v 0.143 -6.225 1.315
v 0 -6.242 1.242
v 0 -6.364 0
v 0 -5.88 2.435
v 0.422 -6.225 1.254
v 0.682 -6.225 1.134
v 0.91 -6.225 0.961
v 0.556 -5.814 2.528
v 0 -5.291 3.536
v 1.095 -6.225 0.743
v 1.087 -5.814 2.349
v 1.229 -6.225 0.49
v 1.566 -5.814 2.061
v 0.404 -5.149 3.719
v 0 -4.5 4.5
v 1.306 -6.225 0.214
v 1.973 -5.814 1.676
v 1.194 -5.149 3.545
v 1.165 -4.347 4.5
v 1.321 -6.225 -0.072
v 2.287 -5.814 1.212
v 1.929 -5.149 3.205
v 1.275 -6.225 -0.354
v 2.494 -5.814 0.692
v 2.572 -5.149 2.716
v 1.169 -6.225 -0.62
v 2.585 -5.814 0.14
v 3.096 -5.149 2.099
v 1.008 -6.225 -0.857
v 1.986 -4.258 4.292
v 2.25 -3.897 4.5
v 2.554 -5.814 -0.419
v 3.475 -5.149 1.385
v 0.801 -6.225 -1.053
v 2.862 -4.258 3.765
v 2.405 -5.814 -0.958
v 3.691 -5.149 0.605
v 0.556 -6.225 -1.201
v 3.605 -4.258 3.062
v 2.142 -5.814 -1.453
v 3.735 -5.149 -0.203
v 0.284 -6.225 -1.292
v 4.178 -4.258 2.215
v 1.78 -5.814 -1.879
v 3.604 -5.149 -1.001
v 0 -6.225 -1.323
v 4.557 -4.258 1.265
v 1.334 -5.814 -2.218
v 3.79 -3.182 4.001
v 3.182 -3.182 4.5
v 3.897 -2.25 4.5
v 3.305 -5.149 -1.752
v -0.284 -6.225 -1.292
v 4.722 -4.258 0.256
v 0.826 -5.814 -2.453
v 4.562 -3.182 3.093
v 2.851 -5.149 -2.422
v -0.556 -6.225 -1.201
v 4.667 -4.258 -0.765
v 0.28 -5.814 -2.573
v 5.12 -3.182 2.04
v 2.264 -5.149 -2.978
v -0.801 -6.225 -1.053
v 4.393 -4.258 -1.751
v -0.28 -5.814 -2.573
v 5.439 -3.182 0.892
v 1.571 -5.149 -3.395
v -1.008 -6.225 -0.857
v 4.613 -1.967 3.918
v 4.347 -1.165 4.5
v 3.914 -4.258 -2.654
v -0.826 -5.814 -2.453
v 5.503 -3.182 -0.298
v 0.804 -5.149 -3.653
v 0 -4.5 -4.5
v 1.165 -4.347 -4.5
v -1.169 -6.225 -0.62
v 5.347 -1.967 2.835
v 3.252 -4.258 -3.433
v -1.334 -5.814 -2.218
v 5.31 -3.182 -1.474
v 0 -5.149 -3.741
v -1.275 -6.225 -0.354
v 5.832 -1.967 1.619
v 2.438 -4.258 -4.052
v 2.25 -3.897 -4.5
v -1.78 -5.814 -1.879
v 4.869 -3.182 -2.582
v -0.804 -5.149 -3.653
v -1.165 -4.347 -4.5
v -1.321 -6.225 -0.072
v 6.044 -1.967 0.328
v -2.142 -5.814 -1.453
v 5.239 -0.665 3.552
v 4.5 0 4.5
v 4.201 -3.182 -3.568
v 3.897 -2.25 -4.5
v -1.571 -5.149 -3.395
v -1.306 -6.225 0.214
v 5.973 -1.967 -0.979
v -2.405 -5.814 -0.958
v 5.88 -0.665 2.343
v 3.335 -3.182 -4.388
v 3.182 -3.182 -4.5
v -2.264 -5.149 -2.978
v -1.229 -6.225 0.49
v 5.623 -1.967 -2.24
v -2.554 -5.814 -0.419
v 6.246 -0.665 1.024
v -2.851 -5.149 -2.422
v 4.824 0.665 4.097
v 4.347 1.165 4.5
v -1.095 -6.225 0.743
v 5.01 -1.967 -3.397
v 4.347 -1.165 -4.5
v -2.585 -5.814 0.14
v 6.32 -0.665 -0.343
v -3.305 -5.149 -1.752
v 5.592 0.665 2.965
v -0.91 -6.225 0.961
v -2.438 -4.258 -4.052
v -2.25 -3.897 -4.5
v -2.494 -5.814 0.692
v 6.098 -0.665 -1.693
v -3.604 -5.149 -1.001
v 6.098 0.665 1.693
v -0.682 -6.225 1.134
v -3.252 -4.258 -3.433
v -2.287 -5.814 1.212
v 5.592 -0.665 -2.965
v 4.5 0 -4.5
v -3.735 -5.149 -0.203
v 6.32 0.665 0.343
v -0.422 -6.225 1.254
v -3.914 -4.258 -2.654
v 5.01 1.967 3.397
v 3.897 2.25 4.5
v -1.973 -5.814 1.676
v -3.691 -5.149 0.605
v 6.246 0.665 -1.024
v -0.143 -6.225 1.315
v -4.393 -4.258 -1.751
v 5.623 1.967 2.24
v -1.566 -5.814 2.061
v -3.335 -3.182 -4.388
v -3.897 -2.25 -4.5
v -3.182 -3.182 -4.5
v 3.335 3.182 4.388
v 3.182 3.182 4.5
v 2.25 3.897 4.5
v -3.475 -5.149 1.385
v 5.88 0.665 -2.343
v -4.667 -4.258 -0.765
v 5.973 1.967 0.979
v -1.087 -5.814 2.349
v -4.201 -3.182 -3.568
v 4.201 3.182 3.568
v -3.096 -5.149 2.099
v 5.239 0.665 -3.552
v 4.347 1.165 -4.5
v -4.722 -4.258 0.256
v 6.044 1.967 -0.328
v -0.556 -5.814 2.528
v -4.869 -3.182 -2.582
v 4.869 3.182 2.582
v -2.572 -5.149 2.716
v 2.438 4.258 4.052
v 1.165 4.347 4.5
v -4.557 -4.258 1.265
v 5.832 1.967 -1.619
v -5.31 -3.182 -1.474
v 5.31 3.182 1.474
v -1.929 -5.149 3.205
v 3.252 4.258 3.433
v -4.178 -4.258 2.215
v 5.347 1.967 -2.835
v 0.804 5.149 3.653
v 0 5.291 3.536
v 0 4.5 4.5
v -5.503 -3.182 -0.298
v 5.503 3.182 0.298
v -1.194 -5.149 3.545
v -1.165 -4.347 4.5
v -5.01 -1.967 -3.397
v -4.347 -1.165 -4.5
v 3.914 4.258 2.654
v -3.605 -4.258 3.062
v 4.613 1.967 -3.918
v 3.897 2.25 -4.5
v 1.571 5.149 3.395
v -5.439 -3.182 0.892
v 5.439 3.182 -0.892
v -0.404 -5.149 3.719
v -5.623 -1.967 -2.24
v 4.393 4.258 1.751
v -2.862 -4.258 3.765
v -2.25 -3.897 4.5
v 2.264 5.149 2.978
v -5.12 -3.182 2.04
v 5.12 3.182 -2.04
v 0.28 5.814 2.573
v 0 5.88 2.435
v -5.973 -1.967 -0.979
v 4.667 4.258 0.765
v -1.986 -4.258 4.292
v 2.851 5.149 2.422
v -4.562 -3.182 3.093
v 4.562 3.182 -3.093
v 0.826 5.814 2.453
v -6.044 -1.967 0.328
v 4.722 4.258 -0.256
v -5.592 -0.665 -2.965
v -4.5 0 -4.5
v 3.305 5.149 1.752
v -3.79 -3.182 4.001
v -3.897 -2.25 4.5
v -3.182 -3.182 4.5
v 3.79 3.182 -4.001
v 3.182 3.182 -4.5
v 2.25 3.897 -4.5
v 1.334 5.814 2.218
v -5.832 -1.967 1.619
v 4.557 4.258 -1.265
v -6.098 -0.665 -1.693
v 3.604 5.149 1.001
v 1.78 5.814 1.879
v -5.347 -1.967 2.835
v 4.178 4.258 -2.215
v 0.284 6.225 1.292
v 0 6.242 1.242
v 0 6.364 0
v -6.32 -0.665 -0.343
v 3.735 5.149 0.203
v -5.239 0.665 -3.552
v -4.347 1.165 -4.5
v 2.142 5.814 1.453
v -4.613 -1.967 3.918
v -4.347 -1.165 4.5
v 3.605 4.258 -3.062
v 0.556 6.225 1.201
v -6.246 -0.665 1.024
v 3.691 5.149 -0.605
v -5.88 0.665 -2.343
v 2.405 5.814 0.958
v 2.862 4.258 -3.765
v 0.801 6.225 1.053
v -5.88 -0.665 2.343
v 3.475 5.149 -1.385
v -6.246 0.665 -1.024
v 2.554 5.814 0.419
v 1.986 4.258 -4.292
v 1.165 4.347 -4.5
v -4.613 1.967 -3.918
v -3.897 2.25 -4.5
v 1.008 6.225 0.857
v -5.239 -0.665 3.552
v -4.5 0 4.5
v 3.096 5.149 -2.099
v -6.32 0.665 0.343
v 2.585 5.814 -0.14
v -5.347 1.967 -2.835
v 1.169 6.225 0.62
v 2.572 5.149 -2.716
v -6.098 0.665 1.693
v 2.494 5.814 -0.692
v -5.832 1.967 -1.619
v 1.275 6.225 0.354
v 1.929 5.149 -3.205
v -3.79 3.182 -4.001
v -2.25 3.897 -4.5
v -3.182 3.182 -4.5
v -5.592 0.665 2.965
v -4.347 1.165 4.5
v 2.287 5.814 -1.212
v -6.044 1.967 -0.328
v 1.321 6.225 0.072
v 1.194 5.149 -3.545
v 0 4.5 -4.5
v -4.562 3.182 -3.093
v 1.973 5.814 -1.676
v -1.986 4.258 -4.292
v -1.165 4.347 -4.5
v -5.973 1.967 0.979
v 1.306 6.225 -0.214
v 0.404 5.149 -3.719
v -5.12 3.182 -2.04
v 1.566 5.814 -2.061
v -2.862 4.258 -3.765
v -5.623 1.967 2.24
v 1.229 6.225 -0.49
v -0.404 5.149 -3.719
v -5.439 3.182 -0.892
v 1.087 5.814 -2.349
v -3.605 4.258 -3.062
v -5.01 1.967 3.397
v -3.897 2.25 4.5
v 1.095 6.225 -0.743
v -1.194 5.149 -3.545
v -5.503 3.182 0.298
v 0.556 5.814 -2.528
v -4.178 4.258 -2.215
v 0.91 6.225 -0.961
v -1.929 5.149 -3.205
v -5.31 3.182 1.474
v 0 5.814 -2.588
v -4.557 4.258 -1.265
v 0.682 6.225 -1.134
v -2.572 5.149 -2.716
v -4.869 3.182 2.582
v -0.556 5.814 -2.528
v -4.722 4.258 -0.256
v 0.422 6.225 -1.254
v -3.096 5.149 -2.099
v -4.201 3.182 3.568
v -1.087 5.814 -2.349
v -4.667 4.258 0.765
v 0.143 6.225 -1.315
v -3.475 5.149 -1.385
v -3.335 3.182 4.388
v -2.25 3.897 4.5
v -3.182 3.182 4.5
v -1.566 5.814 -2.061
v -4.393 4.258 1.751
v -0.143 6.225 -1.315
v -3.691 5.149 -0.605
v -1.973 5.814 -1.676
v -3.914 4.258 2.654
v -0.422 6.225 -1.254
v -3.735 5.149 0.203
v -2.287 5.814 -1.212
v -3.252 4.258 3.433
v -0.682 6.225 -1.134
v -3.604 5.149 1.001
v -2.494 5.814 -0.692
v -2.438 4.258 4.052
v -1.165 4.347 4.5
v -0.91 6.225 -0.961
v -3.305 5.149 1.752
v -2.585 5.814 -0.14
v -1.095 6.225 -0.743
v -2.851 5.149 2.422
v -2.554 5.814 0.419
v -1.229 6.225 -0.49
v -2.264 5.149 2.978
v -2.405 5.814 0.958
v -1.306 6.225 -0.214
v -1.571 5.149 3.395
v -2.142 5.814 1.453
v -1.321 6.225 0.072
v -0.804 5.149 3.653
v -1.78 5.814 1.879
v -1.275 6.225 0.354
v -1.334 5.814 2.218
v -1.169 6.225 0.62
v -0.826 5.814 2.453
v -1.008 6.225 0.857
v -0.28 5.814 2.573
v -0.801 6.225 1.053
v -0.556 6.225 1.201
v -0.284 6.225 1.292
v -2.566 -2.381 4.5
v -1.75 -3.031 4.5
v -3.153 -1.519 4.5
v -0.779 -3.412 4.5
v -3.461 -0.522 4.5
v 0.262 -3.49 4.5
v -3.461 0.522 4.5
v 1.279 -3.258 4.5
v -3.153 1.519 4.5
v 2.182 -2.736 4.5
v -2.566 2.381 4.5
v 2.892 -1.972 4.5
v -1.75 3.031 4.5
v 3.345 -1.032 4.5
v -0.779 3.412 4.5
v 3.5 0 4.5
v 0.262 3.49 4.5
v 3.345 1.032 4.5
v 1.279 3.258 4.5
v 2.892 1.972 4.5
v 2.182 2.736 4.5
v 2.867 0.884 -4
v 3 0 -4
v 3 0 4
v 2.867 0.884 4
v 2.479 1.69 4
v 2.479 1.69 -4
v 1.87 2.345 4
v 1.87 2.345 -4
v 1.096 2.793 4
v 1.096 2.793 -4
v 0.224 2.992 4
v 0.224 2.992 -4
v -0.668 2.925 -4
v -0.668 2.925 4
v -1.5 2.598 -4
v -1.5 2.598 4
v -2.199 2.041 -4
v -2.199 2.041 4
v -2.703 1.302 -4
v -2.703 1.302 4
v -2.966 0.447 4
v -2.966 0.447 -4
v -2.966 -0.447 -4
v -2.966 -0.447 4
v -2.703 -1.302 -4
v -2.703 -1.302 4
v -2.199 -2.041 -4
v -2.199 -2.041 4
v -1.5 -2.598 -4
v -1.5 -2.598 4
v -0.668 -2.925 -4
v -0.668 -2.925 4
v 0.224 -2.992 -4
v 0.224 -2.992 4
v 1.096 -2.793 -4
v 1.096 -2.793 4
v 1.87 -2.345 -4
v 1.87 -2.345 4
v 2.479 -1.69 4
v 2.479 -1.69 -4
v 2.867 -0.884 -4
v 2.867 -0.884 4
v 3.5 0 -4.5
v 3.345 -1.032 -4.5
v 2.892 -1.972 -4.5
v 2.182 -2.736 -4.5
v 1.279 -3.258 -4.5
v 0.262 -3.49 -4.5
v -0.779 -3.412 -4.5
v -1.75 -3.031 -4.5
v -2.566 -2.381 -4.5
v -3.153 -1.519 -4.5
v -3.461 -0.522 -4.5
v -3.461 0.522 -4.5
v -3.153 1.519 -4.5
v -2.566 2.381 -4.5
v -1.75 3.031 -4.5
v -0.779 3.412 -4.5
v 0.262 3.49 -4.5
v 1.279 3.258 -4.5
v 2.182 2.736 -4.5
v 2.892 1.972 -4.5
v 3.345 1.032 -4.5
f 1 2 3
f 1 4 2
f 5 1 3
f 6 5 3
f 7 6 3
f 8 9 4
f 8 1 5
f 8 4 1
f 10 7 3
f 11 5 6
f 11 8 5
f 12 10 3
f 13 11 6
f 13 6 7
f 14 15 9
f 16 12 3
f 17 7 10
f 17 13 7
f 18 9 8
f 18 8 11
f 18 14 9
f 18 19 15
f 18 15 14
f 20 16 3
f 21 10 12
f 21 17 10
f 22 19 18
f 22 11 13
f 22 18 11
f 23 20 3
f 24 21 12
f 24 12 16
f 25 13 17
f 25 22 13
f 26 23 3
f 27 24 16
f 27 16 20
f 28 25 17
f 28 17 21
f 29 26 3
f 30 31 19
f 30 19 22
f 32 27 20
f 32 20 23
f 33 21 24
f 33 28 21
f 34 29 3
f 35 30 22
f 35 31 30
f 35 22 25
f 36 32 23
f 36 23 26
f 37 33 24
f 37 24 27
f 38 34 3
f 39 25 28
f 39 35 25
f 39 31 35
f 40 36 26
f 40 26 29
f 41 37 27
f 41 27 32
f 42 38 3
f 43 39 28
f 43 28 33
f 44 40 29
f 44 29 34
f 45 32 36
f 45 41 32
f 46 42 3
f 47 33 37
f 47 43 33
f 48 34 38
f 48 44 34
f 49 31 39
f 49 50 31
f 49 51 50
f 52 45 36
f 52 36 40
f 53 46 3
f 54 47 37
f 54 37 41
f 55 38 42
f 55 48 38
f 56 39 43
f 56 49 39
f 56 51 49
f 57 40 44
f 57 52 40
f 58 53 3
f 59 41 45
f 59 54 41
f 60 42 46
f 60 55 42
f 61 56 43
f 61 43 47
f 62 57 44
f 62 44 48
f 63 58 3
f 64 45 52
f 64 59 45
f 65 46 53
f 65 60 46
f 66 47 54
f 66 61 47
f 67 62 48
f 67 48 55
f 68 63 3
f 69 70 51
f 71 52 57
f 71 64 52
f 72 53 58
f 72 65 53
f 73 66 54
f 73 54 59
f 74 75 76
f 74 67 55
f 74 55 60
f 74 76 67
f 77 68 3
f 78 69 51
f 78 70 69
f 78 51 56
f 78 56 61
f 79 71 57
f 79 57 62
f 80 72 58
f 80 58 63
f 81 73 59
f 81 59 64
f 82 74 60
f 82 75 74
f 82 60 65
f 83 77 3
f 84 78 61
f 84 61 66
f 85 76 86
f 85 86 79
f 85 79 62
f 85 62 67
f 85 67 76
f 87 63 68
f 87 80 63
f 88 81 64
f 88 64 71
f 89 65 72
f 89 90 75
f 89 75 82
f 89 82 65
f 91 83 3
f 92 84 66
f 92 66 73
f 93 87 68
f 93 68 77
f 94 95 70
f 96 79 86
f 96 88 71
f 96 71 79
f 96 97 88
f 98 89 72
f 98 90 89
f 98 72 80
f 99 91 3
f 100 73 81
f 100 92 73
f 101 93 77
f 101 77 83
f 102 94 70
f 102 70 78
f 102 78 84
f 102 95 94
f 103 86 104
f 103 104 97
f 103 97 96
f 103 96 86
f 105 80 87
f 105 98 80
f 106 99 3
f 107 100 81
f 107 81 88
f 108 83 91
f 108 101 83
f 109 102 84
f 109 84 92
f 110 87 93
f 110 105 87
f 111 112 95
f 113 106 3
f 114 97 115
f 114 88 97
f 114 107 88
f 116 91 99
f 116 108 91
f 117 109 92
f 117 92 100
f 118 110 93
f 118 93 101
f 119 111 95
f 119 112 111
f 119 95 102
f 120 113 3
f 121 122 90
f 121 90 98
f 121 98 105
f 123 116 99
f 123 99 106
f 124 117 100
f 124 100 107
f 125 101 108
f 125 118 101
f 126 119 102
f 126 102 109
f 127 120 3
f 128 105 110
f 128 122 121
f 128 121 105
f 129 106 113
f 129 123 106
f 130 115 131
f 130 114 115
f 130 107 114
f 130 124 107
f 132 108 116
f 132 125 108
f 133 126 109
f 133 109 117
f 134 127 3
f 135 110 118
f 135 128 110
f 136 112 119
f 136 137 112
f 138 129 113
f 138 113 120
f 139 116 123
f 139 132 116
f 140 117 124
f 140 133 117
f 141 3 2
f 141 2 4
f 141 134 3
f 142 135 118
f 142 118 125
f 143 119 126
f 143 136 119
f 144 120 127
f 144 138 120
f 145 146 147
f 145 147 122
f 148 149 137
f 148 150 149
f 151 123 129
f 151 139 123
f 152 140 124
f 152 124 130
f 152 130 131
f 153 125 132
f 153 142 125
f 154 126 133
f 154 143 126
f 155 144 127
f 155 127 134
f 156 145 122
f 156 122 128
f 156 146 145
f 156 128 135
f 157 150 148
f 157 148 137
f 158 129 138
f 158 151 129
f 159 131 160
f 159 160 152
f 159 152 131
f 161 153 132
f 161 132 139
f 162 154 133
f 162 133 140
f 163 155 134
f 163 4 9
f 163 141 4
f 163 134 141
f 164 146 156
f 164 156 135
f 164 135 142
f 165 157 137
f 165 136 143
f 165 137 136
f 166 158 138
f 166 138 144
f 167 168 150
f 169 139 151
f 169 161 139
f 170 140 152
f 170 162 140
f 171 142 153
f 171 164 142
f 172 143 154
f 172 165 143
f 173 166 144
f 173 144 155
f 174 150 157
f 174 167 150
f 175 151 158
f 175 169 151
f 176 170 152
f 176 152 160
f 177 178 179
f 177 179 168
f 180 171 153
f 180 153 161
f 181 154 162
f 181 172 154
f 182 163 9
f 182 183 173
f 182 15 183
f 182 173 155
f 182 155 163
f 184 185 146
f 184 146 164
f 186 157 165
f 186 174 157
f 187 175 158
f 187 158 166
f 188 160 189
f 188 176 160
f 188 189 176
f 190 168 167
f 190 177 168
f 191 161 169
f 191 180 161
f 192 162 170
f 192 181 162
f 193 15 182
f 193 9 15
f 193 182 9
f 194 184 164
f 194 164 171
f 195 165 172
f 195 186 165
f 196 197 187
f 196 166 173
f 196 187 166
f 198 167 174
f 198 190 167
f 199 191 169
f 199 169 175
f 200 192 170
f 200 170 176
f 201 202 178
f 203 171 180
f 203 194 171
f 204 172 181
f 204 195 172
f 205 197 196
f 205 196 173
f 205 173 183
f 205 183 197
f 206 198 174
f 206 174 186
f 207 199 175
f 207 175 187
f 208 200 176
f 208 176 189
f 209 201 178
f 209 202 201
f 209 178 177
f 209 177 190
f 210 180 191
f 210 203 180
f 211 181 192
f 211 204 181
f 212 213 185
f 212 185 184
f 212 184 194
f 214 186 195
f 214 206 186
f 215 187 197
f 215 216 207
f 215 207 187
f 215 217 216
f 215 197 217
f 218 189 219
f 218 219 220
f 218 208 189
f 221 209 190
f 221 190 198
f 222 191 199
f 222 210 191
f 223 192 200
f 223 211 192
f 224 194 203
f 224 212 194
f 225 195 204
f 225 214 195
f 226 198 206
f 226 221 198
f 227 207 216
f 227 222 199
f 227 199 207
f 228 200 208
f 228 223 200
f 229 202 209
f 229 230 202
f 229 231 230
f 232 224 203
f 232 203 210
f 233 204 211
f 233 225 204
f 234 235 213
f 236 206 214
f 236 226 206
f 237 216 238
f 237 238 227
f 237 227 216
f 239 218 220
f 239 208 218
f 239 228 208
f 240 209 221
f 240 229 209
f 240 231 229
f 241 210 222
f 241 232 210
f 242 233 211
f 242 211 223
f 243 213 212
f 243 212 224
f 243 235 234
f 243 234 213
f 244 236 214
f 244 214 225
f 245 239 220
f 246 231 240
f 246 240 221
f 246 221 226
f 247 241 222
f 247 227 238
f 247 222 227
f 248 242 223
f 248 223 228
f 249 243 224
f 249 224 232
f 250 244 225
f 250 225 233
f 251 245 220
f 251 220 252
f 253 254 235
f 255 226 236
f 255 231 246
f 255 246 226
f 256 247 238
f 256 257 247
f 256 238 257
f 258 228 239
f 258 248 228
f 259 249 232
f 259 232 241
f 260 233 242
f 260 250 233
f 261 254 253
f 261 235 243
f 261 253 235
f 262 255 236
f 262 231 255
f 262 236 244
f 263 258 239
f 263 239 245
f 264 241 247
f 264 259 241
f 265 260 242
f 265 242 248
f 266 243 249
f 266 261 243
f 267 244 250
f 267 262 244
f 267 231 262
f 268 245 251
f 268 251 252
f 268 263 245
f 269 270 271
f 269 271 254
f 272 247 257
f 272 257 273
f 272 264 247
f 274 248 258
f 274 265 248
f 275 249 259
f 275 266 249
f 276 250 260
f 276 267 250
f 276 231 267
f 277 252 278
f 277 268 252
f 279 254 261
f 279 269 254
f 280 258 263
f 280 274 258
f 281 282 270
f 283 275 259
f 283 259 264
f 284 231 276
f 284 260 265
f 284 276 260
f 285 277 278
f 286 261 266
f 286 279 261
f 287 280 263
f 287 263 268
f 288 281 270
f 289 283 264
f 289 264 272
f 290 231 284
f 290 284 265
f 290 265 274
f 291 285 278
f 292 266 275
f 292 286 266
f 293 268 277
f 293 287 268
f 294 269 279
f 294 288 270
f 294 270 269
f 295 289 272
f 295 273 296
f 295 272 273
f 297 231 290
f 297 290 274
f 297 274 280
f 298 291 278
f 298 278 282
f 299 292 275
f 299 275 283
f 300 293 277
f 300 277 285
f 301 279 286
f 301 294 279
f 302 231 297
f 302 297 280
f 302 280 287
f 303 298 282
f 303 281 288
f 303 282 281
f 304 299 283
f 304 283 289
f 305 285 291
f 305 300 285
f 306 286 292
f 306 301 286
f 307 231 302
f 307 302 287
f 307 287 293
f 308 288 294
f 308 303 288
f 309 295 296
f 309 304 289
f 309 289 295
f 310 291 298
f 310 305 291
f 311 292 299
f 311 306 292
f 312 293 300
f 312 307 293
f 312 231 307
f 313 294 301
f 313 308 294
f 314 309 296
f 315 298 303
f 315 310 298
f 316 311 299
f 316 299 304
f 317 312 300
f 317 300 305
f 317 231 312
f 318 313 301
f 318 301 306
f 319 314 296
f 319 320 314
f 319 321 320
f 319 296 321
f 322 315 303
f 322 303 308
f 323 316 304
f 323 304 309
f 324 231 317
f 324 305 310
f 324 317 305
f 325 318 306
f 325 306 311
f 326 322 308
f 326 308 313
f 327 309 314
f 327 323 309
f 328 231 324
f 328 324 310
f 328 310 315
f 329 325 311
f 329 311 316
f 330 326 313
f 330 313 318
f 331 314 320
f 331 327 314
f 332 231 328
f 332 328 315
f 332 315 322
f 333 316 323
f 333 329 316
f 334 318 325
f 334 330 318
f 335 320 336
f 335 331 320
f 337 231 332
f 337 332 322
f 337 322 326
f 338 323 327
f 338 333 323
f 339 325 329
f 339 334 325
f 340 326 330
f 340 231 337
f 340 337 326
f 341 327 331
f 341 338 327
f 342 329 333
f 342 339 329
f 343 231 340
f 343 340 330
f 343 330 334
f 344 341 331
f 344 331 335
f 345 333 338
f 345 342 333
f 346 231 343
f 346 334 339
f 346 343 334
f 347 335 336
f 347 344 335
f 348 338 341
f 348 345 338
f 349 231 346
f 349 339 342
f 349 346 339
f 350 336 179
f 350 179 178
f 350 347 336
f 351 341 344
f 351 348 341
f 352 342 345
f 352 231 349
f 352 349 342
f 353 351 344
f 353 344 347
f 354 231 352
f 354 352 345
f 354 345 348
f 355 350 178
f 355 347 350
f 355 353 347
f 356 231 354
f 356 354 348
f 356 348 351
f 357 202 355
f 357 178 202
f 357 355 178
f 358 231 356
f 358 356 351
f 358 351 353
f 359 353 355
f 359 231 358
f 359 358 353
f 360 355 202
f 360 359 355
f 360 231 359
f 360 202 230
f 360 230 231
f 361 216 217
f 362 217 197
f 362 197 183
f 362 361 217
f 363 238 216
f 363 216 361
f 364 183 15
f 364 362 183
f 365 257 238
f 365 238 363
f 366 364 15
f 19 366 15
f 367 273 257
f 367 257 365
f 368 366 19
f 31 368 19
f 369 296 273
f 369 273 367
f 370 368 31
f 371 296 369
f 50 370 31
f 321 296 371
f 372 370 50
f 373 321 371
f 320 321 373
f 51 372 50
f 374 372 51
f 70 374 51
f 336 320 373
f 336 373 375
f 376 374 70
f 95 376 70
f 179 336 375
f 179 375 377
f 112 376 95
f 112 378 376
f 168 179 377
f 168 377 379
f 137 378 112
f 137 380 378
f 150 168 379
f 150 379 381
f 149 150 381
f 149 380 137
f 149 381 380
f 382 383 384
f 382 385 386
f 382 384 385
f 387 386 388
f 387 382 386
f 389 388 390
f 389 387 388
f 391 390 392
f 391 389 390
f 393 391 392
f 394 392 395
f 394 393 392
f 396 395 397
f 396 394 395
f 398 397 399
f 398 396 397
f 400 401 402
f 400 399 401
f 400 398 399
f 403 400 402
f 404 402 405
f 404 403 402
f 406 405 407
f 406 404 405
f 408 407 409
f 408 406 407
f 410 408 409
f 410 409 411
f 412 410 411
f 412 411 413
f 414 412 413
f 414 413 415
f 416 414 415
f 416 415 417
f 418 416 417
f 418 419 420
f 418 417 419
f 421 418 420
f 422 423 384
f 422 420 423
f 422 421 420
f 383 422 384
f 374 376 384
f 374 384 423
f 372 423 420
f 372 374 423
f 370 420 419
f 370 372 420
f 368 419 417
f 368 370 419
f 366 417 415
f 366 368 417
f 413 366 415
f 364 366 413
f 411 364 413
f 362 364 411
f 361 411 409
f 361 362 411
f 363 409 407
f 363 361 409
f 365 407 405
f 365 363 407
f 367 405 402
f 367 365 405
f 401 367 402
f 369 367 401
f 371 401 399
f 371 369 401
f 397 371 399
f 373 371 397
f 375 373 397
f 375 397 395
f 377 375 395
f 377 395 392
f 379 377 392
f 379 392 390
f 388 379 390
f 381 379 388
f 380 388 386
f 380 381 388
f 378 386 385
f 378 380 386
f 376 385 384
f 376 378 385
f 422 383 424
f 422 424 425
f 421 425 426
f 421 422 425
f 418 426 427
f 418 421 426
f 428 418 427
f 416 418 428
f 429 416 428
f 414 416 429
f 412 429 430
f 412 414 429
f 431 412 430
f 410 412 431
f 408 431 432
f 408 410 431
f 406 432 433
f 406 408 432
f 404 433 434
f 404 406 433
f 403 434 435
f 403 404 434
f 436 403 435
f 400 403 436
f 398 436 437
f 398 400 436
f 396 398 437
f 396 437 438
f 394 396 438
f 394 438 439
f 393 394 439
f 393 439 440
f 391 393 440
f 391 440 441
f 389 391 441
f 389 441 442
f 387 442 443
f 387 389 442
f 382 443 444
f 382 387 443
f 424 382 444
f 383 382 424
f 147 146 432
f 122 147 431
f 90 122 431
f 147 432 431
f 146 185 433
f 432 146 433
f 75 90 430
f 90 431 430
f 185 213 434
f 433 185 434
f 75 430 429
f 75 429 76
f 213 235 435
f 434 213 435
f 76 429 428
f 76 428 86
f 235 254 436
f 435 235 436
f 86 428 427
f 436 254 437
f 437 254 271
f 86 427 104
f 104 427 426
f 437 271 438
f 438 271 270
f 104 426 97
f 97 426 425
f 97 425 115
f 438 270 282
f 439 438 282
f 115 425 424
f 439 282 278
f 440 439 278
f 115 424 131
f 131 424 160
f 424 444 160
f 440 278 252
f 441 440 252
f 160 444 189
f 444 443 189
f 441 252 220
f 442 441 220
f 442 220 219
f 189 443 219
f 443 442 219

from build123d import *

# Parameters (mm, degrees)
SZKIC2_W                        = 14
SZKIC2_H                        = 14
DODANIE_WYCI_GNI_CIE1_DEPTH     = 4.5
WYTNIJ_WYCI_GNI_CIE1_DEPTH      = 11.062305899
WYTNIJ_WYCI_GNI_CIE1_DEPTH_BACK = 11.062305899
SZKIC7_R                        = 3
SFAZOWANIE1_SIZE                = 0.5


with BuildPart() as part:
    # Szkic2 → Dodanie-wyciągnięcie1 (new, symmetric)
    with BuildSketch(Plane.XY):
        Rectangle(SZKIC2_W, SZKIC2_H)
    extrude(amount=DODANIE_WYCI_GNI_CIE1_DEPTH, both=True)

    # Szkic6 → Wycięcie-obrót1 (revolve, cut)
    with BuildSketch(Plane(origin=(0, 0, 0), x_dir=(0, 0, -1), z_dir=(1, 0, 0))):
        with BuildLine():
            Line((0, 6.363961031), (0, 11.1169554))
            Line((0, 11.1169554), (-10.01359094, 11.1169554))
            Line((-10.01359094, 11.1169554), (-10.01359094, -12.11227334))
            Line((-10.01359094, -12.11227334), (0, -12.11227334))
            Line((0, -12.11227334), (0, -6.363961031))
            ThreePointArc((0, -6.363961031), (-6.363961031, 0), (0, 6.363961031))
        make_face()
    revolve(axis=Axis((0, -12.574301311, 0), (0, 1, 0)), mode=Mode.SUBTRACT)

    # Szkic7 → Wytnij-wyciągnięcie1 (cut, two sides: drawn at the far end of the back side and taken through both)
    with BuildSketch(Plane.XY.offset(-WYTNIJ_WYCI_GNI_CIE1_DEPTH_BACK)):
        Circle(SZKIC7_R)
    extrude(amount=WYTNIJ_WYCI_GNI_CIE1_DEPTH + WYTNIJ_WYCI_GNI_CIE1_DEPTH_BACK, mode=Mode.SUBTRACT)

    # Sfazowanie1
    sfazowanie1_edges = [part.edges().sort_by_distance(p)[0] for p in [
        (-3, 0, -4.5),
        (-3, 0, 4.5),
    ]]
    chamfer(sfazowanie1_edges, length=SFAZOWANIE1_SIZE)


solid = part.part
